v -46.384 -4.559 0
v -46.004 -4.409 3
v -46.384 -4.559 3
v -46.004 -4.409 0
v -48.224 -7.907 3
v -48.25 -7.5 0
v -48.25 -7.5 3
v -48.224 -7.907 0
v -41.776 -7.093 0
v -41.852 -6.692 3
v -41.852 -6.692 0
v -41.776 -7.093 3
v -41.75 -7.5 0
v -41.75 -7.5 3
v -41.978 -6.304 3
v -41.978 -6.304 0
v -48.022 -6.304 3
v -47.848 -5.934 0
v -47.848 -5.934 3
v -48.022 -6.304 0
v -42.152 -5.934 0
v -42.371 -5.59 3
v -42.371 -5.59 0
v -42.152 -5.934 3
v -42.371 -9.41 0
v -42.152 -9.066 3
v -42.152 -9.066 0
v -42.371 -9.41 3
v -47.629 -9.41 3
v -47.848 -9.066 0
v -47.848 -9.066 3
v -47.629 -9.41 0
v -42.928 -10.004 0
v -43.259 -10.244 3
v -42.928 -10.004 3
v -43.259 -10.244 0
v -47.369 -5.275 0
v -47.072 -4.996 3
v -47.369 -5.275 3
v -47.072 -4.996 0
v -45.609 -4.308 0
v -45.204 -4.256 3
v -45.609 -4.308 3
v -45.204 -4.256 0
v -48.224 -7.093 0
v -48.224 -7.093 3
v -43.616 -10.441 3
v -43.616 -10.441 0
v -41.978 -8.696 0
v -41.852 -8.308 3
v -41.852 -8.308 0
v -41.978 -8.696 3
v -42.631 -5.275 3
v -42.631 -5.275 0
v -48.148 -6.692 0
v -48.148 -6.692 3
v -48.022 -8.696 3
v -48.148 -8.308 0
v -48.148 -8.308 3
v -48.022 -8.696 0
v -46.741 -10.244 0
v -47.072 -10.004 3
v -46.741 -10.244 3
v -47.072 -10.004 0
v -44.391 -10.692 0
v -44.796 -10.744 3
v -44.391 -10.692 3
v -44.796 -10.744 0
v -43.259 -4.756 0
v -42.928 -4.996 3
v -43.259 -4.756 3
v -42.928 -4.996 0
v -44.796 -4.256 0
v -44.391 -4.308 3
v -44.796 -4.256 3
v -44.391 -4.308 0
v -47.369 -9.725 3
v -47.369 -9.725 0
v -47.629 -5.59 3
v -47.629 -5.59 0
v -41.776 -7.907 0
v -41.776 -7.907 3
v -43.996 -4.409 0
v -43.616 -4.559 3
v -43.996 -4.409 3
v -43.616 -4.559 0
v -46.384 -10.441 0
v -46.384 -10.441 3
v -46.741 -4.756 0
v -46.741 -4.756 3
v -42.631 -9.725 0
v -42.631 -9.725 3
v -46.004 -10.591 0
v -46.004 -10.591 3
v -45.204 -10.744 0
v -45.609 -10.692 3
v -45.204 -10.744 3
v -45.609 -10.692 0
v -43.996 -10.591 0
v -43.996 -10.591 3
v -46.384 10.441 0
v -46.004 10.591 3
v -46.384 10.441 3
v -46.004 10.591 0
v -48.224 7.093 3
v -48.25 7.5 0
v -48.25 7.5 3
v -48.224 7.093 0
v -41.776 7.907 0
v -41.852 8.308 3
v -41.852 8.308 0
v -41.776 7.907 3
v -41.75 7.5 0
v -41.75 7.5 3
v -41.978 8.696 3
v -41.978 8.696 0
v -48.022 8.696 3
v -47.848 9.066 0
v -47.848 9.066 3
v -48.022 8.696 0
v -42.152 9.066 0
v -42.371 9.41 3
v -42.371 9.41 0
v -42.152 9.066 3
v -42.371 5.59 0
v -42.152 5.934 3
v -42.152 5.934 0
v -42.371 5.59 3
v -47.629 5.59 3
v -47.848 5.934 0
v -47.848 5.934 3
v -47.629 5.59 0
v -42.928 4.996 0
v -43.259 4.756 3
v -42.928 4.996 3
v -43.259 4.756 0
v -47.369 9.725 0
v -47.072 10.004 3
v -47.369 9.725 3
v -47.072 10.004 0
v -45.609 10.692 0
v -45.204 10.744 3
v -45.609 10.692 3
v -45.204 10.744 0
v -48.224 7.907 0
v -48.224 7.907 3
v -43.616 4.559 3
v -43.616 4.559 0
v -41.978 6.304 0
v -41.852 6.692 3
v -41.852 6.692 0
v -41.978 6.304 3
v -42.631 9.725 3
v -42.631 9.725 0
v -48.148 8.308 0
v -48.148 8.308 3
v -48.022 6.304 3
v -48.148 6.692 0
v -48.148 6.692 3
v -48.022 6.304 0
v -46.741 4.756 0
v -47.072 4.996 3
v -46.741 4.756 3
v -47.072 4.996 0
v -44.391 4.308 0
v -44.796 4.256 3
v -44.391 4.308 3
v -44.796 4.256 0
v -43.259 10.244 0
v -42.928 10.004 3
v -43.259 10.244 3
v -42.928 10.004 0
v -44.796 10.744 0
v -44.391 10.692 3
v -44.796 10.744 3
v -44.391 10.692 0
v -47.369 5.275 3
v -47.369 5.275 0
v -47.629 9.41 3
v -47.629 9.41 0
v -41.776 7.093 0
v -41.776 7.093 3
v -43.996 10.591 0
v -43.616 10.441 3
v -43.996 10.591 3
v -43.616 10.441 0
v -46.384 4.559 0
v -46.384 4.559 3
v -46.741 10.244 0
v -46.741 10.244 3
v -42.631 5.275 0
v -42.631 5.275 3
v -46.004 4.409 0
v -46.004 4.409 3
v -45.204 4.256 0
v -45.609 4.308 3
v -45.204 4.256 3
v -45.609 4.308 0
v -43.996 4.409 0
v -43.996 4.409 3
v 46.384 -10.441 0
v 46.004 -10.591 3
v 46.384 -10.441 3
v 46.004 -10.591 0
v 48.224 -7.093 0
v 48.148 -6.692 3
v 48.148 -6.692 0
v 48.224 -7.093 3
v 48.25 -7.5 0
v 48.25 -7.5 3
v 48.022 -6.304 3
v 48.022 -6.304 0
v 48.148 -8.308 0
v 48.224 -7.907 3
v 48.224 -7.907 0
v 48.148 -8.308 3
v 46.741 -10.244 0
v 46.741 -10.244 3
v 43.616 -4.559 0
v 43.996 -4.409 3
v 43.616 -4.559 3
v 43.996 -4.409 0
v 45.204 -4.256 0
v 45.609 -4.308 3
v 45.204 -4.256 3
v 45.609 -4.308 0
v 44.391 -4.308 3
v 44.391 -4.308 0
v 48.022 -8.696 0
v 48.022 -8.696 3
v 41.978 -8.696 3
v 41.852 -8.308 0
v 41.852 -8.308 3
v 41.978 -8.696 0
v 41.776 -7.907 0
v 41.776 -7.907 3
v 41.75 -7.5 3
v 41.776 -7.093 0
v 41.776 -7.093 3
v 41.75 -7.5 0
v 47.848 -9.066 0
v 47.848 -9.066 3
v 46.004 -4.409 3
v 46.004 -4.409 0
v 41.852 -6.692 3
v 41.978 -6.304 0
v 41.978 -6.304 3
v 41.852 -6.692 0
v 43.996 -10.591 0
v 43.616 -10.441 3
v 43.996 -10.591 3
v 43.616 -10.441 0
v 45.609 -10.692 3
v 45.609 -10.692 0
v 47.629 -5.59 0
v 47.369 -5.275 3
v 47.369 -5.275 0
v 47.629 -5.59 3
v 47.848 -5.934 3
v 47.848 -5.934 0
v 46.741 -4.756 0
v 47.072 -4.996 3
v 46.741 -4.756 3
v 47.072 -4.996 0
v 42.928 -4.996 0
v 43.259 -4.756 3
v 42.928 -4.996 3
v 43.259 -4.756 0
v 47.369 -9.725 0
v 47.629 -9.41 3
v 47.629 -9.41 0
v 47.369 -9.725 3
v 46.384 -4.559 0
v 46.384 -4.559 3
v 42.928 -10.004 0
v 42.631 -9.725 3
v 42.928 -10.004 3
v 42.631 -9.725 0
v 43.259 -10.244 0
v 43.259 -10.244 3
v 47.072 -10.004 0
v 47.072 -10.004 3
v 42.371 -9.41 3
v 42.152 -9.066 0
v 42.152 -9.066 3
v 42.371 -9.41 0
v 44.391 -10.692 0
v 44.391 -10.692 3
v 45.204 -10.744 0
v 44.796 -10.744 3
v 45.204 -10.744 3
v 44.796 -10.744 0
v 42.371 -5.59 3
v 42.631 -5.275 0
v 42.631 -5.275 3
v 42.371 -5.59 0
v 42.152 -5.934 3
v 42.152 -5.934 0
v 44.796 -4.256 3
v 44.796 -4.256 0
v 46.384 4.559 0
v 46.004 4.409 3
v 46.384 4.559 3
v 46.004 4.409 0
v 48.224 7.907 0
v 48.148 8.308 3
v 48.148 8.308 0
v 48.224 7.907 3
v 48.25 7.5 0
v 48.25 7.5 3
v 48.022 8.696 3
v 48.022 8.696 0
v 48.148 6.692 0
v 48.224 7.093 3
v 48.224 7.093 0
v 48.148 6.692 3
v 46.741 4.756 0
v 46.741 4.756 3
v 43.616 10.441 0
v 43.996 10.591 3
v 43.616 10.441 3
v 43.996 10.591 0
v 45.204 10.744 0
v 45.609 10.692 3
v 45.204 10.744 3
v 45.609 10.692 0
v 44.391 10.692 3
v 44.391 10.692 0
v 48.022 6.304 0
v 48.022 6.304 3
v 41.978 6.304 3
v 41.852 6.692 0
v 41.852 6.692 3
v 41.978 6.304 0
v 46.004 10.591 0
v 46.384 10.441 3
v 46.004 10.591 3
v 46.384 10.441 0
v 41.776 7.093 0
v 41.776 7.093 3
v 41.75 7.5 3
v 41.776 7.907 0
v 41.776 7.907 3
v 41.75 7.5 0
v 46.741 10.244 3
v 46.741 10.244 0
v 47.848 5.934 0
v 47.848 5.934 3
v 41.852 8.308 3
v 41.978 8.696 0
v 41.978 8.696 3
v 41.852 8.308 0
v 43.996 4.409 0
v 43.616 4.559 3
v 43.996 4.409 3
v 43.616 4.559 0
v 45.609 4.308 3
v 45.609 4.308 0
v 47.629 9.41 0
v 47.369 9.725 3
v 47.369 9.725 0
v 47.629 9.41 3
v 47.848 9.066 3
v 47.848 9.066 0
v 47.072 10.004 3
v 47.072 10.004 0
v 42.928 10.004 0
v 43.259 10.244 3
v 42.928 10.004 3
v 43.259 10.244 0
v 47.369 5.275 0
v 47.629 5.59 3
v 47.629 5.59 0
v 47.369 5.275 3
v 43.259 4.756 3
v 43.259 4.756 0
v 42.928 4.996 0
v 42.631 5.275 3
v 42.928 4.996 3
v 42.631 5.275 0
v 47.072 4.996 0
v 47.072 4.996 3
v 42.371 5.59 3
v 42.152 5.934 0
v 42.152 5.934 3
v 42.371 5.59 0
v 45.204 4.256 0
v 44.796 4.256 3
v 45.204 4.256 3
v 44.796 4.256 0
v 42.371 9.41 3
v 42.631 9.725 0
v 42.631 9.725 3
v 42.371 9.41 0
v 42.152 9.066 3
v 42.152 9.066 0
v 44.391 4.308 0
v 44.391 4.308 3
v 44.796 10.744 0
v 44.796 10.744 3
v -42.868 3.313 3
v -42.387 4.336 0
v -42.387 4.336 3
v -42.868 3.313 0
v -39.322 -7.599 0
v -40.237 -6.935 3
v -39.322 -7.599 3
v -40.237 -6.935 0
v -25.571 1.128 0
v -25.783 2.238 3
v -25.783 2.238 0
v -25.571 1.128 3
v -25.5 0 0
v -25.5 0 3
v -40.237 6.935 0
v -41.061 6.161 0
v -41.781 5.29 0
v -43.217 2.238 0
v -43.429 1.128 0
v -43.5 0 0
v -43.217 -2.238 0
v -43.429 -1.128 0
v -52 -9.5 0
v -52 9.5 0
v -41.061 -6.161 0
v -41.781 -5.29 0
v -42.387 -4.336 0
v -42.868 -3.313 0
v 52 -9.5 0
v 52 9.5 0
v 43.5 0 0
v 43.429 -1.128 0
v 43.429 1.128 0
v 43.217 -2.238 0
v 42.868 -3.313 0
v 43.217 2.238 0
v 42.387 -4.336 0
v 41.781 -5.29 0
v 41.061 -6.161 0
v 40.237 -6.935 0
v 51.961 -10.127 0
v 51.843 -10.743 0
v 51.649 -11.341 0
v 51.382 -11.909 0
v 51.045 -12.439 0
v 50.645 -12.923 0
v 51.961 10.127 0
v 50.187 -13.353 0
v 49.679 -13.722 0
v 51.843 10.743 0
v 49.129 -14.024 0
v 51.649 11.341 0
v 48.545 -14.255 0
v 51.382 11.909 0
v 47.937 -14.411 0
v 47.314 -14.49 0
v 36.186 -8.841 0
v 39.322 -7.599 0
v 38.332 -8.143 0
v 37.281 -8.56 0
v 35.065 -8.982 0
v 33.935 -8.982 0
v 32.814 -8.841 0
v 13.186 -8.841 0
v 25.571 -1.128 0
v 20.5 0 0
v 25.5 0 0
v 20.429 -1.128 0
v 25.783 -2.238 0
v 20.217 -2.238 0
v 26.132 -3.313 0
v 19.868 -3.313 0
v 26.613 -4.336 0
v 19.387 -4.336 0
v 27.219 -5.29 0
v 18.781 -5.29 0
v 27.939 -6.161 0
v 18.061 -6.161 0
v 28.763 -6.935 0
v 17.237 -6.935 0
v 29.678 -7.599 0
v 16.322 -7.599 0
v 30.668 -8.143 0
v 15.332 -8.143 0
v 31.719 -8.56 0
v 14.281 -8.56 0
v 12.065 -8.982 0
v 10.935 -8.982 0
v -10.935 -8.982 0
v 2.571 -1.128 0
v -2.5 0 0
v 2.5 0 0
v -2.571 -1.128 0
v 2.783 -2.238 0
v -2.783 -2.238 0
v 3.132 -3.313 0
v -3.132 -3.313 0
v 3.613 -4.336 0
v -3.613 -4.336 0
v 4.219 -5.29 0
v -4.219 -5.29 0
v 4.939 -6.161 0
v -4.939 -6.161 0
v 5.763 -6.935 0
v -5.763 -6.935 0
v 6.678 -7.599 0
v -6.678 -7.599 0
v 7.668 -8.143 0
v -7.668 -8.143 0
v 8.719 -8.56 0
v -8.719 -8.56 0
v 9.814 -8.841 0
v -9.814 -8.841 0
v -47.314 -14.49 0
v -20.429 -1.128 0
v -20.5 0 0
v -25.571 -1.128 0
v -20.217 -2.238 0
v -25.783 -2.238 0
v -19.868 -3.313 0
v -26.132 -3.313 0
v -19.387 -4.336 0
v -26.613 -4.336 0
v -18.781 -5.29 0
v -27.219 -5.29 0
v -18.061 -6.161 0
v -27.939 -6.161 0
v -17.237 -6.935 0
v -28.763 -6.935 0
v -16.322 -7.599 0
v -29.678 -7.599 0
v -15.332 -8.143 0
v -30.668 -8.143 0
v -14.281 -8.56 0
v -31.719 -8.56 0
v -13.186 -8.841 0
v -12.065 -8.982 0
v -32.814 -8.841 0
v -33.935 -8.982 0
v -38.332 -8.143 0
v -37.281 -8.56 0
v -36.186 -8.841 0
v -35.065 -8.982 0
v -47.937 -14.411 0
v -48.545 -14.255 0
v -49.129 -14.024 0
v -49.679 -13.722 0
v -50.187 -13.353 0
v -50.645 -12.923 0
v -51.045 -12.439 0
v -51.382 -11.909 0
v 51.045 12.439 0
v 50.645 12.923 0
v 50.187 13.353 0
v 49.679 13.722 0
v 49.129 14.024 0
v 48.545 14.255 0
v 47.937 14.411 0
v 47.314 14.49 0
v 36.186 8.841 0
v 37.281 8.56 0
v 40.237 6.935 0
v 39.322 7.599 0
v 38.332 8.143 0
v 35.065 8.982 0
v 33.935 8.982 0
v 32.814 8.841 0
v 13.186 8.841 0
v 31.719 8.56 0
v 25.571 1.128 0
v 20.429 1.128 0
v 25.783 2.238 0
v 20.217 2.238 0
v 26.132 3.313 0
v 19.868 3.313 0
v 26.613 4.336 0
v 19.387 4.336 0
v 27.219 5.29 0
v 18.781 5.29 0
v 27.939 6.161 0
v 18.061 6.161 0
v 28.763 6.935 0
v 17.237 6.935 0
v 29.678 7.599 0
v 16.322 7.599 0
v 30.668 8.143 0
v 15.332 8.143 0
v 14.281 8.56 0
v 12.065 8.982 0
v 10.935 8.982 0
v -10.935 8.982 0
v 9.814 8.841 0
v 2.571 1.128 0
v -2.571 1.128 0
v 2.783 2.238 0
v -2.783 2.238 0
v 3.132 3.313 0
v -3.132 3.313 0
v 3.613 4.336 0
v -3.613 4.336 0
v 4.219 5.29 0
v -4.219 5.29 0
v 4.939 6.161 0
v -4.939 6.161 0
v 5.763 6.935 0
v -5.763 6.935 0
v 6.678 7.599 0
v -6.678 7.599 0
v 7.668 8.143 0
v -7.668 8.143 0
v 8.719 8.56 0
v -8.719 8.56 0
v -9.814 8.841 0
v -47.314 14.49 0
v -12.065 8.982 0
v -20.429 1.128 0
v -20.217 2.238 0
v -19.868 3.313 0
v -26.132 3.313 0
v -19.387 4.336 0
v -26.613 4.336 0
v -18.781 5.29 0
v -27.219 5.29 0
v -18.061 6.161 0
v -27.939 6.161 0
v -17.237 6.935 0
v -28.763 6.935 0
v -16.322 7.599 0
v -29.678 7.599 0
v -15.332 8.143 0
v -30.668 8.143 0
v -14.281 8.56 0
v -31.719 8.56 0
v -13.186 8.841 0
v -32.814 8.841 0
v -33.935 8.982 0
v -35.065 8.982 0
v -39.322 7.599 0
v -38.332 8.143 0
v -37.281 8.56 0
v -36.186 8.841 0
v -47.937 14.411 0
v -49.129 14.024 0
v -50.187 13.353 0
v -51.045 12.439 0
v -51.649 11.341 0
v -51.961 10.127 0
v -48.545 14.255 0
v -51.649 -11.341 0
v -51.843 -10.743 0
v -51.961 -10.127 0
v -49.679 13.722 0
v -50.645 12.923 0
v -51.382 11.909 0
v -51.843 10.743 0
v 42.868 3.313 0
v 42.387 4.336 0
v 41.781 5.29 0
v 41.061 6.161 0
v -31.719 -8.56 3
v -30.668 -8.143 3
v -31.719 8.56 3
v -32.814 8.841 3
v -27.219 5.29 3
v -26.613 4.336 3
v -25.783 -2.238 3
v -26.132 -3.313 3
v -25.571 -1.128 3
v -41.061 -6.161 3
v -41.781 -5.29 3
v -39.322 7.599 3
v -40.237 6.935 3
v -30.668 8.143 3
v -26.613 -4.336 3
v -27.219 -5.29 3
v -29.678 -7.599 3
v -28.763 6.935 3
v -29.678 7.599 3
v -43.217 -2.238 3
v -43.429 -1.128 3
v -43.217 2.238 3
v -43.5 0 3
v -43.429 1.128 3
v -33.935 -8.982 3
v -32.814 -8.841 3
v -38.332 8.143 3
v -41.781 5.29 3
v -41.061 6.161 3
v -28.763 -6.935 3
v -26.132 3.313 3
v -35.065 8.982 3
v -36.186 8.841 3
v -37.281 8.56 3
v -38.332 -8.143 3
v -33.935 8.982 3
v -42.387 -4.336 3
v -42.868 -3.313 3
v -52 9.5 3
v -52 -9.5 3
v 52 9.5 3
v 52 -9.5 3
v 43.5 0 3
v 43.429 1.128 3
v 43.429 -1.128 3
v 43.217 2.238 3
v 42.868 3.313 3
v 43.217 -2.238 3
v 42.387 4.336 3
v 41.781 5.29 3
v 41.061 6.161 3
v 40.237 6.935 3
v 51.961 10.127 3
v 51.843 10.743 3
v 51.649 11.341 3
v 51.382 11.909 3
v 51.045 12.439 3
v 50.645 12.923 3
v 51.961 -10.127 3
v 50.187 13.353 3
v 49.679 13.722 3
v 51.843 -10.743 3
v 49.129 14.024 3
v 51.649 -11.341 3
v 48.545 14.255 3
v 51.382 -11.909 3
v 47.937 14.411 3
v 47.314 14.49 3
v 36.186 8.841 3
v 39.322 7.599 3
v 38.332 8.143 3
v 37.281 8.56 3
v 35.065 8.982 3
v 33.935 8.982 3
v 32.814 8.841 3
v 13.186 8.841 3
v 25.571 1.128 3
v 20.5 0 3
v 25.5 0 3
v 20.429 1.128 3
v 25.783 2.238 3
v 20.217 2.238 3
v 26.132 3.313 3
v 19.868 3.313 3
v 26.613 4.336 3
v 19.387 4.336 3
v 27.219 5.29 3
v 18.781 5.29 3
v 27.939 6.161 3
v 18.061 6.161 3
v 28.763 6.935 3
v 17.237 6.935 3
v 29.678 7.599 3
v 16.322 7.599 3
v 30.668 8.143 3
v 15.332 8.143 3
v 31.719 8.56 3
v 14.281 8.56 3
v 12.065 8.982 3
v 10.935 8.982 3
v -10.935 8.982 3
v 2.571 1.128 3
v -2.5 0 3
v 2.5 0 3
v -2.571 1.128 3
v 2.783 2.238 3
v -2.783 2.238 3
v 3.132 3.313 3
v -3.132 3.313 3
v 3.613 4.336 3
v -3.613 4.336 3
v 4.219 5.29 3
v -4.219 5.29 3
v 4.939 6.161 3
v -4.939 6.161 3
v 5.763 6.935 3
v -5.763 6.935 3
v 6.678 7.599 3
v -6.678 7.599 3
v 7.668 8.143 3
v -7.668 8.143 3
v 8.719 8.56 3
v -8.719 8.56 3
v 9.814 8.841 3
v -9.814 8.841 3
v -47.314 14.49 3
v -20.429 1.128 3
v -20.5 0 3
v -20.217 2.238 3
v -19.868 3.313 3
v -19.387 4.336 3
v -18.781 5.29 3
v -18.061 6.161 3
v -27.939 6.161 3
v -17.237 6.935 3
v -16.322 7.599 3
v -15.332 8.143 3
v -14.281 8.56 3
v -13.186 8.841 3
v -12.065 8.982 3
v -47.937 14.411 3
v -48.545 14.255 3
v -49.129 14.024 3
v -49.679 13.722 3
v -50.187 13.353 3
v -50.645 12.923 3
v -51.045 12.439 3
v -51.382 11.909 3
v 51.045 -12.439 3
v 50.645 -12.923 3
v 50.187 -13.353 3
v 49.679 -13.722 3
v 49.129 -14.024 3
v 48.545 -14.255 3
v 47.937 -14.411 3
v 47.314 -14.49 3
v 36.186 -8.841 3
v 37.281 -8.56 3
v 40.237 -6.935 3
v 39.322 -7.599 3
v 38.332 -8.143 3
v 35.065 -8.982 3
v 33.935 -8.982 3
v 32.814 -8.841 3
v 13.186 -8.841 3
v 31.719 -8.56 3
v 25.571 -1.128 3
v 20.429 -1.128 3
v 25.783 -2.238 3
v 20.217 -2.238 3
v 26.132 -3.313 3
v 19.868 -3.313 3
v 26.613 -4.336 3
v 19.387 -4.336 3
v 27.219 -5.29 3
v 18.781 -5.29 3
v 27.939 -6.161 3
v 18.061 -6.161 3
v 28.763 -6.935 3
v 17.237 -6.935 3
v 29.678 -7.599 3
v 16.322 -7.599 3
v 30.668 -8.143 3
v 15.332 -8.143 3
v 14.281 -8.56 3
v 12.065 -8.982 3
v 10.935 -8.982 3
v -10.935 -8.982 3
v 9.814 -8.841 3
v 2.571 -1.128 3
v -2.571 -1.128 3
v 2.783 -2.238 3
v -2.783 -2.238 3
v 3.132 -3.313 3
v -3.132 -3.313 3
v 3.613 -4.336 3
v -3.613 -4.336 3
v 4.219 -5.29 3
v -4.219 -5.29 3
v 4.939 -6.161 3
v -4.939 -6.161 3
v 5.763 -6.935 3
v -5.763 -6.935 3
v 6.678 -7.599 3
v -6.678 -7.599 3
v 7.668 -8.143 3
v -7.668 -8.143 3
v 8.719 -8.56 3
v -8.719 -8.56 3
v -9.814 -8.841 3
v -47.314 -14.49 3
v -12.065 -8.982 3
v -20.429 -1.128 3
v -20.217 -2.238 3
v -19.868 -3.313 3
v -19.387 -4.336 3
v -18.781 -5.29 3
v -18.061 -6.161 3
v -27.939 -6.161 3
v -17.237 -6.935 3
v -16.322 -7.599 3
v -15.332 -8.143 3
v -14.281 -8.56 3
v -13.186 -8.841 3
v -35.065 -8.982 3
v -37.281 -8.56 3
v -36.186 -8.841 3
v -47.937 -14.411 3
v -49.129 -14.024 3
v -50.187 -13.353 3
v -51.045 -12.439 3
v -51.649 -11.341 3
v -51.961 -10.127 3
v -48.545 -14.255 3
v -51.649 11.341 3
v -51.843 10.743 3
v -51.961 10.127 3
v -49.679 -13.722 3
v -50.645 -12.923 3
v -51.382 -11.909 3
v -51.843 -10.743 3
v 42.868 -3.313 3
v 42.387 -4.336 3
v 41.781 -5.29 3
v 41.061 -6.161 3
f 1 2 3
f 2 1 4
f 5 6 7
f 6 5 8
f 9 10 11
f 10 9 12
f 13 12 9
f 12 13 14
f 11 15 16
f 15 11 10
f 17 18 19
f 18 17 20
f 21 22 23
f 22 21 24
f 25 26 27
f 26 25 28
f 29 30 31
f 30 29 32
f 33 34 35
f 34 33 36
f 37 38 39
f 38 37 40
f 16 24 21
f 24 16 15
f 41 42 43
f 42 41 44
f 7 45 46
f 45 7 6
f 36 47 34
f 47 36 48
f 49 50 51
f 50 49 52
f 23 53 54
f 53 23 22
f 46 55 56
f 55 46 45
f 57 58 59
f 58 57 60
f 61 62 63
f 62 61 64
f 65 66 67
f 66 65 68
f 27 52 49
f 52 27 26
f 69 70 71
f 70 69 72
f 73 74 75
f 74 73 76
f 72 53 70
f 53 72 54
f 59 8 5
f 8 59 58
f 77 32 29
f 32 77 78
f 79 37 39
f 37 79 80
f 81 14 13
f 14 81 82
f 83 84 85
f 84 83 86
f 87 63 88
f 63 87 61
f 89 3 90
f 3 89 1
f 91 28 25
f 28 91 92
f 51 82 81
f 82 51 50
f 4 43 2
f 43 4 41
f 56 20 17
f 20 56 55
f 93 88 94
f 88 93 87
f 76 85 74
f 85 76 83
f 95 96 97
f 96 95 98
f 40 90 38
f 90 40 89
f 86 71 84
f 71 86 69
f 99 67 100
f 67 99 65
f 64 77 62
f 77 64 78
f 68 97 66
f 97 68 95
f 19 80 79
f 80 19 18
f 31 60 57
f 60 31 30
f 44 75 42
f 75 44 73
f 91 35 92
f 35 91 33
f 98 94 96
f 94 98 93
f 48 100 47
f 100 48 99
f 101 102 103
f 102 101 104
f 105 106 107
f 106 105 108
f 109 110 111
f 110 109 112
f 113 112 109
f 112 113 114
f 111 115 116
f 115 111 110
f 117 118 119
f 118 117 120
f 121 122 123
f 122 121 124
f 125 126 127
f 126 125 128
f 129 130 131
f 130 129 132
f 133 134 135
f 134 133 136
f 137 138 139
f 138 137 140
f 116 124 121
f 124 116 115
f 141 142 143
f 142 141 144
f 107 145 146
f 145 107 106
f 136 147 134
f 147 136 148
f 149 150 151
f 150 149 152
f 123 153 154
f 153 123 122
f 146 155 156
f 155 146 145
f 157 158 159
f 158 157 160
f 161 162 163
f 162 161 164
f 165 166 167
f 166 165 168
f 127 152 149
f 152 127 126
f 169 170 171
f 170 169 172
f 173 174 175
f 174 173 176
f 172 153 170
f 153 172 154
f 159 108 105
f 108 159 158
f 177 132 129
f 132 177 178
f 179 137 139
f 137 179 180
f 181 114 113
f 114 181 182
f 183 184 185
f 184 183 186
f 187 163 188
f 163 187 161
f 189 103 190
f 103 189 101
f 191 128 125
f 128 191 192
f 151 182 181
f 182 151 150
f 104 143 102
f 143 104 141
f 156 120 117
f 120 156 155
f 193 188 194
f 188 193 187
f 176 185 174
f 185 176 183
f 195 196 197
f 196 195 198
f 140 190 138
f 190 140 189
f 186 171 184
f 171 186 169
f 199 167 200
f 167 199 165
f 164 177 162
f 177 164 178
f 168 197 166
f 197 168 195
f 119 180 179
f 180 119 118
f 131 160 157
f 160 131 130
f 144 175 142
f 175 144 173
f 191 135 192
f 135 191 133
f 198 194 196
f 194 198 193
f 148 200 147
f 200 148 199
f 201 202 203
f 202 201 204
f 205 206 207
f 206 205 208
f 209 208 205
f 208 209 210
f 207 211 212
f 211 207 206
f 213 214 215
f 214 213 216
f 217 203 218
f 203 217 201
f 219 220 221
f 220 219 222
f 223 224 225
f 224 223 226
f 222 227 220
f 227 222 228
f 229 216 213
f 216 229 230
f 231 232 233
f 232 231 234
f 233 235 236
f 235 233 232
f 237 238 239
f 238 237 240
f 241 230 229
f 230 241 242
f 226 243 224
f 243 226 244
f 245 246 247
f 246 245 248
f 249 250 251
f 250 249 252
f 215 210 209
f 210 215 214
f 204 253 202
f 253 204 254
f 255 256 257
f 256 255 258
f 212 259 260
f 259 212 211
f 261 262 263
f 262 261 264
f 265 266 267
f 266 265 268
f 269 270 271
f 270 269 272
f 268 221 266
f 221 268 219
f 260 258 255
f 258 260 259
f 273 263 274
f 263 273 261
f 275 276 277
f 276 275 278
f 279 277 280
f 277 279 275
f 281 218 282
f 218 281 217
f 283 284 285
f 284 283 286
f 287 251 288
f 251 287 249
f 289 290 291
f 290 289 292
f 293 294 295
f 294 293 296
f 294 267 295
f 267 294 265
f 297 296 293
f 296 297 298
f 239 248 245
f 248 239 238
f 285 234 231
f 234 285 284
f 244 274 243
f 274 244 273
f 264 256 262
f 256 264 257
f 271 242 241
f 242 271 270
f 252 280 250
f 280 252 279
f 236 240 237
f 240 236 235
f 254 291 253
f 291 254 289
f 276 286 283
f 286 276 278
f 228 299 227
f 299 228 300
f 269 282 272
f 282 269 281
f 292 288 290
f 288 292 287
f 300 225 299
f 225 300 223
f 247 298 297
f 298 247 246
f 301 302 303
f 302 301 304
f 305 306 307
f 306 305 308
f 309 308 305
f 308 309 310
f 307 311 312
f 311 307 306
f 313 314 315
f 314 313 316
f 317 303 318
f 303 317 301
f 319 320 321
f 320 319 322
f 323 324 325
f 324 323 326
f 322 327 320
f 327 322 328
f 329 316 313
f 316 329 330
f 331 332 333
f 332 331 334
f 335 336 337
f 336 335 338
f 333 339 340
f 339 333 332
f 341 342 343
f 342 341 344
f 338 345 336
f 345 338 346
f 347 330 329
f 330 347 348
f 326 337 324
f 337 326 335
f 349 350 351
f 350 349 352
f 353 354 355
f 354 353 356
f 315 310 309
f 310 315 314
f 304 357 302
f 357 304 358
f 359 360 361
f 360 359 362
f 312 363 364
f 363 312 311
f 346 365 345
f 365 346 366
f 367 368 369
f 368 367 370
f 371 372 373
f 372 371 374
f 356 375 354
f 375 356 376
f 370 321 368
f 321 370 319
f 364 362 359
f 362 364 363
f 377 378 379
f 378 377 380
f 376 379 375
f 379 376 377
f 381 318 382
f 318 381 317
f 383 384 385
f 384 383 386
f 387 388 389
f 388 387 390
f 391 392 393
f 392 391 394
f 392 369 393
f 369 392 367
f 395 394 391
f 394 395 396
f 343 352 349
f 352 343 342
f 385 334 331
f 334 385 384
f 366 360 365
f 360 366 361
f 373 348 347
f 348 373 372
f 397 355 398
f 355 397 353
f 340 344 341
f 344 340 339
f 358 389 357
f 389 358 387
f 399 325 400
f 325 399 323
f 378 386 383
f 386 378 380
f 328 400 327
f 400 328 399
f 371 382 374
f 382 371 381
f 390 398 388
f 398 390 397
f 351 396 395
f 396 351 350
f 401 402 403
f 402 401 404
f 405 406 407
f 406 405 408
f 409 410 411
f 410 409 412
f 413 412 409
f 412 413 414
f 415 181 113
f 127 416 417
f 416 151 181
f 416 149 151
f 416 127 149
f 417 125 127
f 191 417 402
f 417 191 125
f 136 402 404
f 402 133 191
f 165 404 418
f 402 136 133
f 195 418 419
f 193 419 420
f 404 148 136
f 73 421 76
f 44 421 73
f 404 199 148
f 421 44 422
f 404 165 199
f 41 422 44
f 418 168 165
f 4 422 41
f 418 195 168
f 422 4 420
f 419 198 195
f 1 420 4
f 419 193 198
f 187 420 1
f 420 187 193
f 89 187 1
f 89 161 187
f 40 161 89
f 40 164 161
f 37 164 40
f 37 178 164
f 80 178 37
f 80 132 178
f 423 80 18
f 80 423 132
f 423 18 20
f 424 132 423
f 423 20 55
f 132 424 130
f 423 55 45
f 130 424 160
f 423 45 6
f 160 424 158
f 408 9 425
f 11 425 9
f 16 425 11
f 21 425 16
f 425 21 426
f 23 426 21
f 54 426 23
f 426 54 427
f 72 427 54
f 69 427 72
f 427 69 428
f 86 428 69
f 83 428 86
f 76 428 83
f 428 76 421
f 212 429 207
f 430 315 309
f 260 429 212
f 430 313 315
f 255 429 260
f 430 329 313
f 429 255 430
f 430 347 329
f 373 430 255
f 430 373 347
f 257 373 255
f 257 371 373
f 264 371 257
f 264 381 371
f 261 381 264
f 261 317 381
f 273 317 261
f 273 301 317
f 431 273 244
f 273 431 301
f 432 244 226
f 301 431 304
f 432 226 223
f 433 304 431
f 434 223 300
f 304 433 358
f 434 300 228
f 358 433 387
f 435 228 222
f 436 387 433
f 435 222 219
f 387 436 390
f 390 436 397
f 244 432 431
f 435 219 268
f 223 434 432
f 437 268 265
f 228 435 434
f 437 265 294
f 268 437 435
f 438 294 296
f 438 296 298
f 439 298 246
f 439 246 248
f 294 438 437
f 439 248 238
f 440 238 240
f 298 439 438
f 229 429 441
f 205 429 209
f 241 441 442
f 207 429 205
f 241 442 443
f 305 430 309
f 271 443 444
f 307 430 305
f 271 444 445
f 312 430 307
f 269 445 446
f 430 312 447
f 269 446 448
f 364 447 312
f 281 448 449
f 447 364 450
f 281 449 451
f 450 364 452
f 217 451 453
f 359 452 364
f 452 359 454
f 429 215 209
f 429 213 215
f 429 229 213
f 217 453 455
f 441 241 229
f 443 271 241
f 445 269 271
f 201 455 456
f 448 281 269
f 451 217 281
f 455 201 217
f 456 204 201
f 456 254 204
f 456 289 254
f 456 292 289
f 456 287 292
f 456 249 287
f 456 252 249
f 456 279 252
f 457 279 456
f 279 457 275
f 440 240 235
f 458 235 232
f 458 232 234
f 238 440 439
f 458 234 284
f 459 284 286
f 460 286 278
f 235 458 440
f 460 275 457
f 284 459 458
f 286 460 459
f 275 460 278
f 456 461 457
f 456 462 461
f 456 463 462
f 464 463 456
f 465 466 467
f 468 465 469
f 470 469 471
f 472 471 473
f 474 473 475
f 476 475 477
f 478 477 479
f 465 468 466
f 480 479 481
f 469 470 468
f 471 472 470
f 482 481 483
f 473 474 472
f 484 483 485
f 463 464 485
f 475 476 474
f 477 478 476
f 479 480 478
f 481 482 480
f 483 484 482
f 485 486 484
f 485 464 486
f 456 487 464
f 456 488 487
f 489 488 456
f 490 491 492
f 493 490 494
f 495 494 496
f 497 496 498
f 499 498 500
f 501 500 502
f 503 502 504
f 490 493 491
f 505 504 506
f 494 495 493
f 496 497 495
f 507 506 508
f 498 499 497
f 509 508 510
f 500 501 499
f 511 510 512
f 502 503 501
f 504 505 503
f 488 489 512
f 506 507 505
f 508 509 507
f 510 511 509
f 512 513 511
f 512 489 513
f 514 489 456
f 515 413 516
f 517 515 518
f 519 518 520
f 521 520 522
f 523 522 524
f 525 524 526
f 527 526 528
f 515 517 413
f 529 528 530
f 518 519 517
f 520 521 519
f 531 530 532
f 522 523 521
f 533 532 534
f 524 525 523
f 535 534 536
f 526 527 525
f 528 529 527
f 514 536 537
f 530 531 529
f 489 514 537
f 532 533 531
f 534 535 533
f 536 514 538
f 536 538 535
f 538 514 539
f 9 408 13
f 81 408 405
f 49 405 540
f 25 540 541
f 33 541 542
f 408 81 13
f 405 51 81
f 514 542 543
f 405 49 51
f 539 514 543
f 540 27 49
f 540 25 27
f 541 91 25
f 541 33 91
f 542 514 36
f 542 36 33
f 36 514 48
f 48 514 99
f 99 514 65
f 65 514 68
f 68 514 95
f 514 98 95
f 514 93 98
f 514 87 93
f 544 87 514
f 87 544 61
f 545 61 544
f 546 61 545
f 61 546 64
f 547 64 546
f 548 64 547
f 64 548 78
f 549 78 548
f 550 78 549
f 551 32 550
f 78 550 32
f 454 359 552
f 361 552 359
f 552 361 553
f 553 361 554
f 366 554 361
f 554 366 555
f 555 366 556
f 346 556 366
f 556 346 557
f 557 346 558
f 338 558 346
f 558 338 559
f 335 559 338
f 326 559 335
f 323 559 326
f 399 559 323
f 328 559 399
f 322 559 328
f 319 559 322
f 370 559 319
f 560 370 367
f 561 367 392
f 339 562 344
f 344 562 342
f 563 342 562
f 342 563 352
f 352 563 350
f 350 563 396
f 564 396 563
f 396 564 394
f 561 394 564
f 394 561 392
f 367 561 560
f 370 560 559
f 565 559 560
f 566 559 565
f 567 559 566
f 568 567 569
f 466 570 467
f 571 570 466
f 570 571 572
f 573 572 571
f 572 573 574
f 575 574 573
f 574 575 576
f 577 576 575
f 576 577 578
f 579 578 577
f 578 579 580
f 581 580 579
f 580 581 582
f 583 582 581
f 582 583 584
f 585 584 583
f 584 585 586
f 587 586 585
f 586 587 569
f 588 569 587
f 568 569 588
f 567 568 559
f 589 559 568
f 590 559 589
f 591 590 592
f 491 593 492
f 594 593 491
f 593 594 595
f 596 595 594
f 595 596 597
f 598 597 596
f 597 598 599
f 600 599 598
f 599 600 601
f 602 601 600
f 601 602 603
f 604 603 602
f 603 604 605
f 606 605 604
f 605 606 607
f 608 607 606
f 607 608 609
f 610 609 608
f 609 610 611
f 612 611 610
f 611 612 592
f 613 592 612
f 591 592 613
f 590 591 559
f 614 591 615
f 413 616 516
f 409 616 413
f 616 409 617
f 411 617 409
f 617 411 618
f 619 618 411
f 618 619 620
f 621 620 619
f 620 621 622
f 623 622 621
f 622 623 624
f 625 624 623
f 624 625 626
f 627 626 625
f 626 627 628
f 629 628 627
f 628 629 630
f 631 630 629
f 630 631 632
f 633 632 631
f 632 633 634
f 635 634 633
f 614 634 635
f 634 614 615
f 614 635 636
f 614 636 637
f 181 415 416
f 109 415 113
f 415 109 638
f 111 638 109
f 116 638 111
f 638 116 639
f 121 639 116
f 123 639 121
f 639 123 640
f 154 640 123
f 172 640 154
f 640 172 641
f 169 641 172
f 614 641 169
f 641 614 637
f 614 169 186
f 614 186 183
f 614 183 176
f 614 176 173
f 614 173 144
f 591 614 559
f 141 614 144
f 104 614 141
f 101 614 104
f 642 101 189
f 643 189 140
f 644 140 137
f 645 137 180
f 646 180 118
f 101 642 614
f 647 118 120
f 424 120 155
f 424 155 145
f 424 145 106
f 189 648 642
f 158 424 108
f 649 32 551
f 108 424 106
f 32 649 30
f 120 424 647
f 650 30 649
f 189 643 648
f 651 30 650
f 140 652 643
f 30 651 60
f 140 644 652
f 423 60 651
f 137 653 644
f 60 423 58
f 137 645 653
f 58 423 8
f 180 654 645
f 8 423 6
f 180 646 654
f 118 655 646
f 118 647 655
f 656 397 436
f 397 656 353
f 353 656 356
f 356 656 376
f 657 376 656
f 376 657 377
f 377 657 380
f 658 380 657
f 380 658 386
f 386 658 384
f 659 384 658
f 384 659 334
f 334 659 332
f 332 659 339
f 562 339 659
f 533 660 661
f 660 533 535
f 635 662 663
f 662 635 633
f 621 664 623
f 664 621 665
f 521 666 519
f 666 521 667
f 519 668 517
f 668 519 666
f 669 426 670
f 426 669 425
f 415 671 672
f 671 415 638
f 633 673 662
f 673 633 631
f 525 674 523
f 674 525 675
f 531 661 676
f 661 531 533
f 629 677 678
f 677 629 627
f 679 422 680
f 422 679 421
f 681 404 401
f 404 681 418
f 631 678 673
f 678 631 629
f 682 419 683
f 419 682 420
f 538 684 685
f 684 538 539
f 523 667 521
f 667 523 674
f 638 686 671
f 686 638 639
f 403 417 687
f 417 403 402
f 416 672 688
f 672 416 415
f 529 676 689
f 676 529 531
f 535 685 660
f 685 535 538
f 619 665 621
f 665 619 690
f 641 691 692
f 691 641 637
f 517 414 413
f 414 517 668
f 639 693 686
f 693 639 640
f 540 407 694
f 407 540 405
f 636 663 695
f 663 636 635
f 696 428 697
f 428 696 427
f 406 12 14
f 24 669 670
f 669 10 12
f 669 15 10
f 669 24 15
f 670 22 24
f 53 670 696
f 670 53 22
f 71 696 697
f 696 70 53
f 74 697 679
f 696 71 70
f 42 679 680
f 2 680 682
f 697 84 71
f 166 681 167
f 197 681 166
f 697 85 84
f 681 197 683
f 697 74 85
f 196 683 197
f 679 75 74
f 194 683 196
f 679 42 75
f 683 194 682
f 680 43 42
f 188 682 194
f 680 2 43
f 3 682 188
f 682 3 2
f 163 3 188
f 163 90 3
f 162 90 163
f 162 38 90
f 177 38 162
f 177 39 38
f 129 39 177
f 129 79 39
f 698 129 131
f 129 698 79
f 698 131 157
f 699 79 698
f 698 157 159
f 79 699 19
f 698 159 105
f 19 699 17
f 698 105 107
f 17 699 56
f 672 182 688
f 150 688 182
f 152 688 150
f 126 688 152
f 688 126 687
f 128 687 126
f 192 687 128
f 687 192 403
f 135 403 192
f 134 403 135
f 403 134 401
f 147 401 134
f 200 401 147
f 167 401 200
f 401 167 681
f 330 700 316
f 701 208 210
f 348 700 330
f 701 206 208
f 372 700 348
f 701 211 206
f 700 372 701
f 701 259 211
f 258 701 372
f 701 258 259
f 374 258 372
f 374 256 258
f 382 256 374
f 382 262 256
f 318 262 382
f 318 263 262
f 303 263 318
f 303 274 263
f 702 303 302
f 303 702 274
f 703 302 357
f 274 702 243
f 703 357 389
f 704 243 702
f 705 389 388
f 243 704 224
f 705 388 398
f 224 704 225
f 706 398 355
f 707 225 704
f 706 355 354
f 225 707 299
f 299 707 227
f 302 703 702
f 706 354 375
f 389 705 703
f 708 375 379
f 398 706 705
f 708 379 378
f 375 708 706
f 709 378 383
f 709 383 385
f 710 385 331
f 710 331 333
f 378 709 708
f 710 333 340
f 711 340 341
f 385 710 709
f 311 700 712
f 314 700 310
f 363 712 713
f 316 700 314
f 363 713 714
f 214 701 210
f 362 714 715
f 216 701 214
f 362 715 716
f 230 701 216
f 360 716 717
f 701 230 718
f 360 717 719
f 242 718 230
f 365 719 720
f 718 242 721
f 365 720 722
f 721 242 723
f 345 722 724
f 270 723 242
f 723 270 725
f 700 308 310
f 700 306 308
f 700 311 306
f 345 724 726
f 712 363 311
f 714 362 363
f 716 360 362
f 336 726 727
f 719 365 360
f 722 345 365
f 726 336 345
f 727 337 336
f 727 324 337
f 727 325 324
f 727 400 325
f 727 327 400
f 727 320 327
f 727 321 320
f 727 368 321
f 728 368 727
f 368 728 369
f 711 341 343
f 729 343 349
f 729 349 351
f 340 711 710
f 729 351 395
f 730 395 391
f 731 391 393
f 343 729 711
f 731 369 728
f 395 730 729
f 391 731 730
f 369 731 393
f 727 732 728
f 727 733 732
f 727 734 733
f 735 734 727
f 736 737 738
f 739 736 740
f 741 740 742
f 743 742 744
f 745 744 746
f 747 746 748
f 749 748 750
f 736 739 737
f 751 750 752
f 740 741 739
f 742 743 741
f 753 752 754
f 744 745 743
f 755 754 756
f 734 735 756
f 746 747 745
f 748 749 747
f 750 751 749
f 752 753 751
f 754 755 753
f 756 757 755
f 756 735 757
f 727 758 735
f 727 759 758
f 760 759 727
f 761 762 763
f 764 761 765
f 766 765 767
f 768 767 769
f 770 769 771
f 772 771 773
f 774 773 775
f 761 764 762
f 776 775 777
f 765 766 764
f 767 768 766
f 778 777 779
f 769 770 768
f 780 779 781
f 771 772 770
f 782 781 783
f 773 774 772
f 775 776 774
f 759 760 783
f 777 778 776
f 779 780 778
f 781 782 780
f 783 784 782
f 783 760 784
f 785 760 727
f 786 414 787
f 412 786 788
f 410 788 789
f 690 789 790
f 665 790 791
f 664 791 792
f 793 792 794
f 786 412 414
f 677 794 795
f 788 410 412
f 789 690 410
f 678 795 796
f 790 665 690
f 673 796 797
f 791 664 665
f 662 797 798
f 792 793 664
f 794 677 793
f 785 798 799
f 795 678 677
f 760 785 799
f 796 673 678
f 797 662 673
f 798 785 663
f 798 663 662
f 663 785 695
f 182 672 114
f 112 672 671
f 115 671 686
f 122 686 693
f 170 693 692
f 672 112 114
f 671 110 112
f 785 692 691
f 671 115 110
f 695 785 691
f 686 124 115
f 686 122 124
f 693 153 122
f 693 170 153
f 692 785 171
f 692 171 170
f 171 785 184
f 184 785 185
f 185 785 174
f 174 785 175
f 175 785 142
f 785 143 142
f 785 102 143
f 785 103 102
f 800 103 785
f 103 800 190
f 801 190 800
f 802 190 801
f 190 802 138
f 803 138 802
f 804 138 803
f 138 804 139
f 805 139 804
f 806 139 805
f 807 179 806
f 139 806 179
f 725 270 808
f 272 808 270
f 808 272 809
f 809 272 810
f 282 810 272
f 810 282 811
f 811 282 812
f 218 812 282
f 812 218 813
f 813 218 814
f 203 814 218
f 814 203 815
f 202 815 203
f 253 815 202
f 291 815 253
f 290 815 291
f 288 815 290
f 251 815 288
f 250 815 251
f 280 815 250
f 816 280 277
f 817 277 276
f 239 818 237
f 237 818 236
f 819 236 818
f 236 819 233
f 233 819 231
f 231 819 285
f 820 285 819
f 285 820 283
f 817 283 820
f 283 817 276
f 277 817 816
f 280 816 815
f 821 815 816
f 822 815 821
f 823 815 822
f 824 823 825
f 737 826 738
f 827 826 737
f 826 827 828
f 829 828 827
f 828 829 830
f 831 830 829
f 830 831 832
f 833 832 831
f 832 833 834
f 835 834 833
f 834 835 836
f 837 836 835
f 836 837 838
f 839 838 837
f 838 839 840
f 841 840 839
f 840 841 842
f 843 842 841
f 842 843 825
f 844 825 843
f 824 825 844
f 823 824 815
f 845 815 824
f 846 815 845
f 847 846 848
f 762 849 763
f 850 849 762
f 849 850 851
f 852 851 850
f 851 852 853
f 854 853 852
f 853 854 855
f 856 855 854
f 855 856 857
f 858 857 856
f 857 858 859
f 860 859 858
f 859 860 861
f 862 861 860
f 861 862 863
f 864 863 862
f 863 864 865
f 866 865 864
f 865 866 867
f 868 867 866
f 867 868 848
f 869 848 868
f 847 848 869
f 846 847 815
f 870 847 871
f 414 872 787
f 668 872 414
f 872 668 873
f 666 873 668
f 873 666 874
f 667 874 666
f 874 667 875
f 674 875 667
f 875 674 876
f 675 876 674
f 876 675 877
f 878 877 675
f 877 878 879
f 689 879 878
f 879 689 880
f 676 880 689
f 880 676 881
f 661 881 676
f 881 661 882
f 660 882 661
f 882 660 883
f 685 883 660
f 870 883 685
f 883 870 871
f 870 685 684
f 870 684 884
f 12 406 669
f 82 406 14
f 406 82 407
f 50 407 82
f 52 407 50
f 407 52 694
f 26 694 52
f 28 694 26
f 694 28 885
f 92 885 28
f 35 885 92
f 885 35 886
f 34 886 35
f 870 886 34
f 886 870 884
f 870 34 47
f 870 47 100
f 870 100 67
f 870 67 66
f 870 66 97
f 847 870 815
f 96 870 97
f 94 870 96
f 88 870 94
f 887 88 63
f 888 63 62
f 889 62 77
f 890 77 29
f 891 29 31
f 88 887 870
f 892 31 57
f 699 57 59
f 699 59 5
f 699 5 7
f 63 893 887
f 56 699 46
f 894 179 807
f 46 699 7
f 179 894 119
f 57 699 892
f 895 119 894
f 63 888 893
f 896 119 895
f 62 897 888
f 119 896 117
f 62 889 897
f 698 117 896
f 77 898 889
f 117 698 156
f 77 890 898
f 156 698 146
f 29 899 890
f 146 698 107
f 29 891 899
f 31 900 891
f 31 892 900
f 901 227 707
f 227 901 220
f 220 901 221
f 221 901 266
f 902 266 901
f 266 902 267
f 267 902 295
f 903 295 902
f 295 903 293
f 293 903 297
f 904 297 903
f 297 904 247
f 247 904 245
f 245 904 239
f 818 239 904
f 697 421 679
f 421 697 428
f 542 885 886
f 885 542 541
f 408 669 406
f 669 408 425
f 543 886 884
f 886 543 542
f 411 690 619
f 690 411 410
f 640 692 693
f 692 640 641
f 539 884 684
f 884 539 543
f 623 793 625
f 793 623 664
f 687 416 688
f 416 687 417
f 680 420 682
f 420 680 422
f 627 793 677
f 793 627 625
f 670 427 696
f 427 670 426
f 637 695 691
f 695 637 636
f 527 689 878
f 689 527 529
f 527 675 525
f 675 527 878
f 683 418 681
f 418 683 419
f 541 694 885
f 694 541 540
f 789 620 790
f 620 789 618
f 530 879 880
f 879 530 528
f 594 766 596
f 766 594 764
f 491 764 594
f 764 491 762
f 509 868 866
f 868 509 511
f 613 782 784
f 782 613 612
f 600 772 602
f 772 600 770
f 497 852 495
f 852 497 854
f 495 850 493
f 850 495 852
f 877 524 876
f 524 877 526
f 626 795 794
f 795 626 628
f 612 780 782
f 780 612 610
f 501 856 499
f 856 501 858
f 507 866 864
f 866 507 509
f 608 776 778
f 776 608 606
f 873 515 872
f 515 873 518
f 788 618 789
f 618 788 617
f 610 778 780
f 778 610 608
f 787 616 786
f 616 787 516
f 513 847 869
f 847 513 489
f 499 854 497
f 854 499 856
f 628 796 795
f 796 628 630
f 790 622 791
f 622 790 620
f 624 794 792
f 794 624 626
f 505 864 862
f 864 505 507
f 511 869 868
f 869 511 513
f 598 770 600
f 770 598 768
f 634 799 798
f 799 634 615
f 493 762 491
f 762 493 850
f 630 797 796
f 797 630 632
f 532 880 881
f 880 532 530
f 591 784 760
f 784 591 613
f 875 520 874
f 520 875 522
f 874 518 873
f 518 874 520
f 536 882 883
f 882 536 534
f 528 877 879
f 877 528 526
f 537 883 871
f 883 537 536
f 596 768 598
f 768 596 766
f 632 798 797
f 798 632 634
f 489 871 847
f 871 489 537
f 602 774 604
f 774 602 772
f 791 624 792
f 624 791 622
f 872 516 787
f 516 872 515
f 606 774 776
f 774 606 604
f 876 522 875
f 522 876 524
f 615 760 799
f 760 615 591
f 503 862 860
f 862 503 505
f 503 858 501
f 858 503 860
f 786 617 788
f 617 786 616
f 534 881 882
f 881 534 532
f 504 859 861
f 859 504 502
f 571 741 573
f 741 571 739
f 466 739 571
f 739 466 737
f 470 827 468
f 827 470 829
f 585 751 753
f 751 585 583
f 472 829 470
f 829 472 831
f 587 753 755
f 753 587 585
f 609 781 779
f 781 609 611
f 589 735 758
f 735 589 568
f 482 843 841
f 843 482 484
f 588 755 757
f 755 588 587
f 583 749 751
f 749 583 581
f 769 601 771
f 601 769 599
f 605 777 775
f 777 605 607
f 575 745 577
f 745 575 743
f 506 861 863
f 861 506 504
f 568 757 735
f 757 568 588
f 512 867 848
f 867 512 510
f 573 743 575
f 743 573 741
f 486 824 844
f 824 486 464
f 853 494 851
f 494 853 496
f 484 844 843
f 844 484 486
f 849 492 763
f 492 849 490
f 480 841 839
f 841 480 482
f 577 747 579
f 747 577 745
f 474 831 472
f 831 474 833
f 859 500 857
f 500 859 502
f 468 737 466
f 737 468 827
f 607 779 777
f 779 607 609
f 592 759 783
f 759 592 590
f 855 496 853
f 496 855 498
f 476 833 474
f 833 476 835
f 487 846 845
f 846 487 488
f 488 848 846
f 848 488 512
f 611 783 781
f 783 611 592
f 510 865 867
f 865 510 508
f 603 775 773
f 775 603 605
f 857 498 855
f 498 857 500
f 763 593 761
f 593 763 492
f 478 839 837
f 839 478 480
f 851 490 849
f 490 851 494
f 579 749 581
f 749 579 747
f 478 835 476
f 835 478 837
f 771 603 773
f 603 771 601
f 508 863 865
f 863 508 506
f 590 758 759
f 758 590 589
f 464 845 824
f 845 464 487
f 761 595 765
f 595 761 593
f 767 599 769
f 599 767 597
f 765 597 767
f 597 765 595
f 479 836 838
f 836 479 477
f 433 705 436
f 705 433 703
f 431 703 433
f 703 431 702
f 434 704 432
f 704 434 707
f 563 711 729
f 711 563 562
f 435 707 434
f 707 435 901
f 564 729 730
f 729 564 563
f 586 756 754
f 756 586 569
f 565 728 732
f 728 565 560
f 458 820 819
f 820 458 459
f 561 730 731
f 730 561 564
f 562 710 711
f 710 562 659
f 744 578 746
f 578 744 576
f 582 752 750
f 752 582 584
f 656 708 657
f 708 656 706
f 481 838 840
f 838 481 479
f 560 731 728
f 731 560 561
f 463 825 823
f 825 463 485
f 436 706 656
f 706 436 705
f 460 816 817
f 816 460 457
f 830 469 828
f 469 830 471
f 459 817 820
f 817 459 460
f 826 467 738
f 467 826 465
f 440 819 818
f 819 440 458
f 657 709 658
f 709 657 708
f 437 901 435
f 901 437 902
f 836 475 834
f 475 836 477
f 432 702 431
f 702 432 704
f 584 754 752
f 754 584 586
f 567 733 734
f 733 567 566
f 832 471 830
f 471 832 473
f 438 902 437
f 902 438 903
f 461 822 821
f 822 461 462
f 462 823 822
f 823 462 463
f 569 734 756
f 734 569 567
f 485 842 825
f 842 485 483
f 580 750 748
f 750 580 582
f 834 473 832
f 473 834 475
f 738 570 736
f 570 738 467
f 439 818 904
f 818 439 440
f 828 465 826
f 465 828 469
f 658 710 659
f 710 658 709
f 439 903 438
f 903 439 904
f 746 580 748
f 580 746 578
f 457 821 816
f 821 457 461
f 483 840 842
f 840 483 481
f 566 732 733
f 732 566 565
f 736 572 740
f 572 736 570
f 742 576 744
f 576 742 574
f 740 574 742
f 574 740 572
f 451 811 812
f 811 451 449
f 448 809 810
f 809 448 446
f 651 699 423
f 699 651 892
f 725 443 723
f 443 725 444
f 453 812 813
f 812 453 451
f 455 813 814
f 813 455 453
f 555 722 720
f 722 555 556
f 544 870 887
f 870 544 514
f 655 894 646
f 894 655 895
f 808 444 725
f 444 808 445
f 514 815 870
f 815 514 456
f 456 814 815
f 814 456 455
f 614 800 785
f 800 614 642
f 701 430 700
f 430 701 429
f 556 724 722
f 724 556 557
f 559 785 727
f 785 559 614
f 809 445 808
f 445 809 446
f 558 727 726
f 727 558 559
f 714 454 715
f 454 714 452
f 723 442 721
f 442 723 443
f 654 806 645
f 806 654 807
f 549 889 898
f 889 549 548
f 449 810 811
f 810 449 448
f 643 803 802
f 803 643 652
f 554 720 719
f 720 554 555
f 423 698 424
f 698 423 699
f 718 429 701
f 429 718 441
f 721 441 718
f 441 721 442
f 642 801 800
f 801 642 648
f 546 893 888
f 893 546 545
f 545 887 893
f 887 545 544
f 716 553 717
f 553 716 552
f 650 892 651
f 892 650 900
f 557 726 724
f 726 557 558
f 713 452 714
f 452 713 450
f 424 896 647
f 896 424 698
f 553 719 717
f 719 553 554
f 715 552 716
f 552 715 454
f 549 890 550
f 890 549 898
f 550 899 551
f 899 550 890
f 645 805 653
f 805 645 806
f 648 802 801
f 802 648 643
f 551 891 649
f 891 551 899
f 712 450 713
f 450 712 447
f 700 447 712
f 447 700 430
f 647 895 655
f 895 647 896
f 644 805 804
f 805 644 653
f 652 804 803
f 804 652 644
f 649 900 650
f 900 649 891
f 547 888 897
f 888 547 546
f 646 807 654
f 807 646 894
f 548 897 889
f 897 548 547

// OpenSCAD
$fn = 50;

difference() {
	union() {
		hull() {
			translate(v = [-47.0, 9.5, 0]) {
				cylinder(h = 3, r = 5);
			}
			translate(v = [47.0, 9.5, 0]) {
				cylinder(h = 3, r = 5);
			}
			translate(v = [-47.0, -9.5, 0]) {
				cylinder(h = 3, r = 5);
			}
			translate(v = [47.0, -9.5, 0]) {
				cylinder(h = 3, r = 5);
			}
		}
	}
	union() {
		translate(v = [-45.0, -7.5, -100.0]) {
			cylinder(h = 200, r = 3.25);
		}
		translate(v = [-45.0, 7.5, -100.0]) {
			cylinder(h = 200, r = 3.25);
		}
		translate(v = [45.0, -7.5, -100.0]) {
			cylinder(h = 200, r = 3.25);
		}
		translate(v = [45.0, 7.5, -100.0]) {
			cylinder(h = 200, r = 3.25);
		}
		translate(v = [-45.0, -7.5, -100.0]) {
			cylinder(h = 200, r = 1.8);
		}
		translate(v = [-45.0, 7.5, -100.0]) {
			cylinder(h = 200, r = 1.8);
		}
		translate(v = [45.0, -7.5, -100.0]) {
			cylinder(h = 200, r = 1.8);
		}
		translate(v = [45.0, 7.5, -100.0]) {
			cylinder(h = 200, r = 1.8);
		}
		translate(v = [-34.5, 0, 0.0]) {
			cylinder(h = 3, r = 9.0);
		}
		translate(v = [-11.5, 0, 0.0]) {
			cylinder(h = 3, r = 9.0);
		}
		translate(v = [11.5, 0, 0.0]) {
			cylinder(h = 3, r = 9.0);
		}
		translate(v = [34.5, 0, 0.0]) {
			cylinder(h = 3, r = 9.0);
		}
	}
}
